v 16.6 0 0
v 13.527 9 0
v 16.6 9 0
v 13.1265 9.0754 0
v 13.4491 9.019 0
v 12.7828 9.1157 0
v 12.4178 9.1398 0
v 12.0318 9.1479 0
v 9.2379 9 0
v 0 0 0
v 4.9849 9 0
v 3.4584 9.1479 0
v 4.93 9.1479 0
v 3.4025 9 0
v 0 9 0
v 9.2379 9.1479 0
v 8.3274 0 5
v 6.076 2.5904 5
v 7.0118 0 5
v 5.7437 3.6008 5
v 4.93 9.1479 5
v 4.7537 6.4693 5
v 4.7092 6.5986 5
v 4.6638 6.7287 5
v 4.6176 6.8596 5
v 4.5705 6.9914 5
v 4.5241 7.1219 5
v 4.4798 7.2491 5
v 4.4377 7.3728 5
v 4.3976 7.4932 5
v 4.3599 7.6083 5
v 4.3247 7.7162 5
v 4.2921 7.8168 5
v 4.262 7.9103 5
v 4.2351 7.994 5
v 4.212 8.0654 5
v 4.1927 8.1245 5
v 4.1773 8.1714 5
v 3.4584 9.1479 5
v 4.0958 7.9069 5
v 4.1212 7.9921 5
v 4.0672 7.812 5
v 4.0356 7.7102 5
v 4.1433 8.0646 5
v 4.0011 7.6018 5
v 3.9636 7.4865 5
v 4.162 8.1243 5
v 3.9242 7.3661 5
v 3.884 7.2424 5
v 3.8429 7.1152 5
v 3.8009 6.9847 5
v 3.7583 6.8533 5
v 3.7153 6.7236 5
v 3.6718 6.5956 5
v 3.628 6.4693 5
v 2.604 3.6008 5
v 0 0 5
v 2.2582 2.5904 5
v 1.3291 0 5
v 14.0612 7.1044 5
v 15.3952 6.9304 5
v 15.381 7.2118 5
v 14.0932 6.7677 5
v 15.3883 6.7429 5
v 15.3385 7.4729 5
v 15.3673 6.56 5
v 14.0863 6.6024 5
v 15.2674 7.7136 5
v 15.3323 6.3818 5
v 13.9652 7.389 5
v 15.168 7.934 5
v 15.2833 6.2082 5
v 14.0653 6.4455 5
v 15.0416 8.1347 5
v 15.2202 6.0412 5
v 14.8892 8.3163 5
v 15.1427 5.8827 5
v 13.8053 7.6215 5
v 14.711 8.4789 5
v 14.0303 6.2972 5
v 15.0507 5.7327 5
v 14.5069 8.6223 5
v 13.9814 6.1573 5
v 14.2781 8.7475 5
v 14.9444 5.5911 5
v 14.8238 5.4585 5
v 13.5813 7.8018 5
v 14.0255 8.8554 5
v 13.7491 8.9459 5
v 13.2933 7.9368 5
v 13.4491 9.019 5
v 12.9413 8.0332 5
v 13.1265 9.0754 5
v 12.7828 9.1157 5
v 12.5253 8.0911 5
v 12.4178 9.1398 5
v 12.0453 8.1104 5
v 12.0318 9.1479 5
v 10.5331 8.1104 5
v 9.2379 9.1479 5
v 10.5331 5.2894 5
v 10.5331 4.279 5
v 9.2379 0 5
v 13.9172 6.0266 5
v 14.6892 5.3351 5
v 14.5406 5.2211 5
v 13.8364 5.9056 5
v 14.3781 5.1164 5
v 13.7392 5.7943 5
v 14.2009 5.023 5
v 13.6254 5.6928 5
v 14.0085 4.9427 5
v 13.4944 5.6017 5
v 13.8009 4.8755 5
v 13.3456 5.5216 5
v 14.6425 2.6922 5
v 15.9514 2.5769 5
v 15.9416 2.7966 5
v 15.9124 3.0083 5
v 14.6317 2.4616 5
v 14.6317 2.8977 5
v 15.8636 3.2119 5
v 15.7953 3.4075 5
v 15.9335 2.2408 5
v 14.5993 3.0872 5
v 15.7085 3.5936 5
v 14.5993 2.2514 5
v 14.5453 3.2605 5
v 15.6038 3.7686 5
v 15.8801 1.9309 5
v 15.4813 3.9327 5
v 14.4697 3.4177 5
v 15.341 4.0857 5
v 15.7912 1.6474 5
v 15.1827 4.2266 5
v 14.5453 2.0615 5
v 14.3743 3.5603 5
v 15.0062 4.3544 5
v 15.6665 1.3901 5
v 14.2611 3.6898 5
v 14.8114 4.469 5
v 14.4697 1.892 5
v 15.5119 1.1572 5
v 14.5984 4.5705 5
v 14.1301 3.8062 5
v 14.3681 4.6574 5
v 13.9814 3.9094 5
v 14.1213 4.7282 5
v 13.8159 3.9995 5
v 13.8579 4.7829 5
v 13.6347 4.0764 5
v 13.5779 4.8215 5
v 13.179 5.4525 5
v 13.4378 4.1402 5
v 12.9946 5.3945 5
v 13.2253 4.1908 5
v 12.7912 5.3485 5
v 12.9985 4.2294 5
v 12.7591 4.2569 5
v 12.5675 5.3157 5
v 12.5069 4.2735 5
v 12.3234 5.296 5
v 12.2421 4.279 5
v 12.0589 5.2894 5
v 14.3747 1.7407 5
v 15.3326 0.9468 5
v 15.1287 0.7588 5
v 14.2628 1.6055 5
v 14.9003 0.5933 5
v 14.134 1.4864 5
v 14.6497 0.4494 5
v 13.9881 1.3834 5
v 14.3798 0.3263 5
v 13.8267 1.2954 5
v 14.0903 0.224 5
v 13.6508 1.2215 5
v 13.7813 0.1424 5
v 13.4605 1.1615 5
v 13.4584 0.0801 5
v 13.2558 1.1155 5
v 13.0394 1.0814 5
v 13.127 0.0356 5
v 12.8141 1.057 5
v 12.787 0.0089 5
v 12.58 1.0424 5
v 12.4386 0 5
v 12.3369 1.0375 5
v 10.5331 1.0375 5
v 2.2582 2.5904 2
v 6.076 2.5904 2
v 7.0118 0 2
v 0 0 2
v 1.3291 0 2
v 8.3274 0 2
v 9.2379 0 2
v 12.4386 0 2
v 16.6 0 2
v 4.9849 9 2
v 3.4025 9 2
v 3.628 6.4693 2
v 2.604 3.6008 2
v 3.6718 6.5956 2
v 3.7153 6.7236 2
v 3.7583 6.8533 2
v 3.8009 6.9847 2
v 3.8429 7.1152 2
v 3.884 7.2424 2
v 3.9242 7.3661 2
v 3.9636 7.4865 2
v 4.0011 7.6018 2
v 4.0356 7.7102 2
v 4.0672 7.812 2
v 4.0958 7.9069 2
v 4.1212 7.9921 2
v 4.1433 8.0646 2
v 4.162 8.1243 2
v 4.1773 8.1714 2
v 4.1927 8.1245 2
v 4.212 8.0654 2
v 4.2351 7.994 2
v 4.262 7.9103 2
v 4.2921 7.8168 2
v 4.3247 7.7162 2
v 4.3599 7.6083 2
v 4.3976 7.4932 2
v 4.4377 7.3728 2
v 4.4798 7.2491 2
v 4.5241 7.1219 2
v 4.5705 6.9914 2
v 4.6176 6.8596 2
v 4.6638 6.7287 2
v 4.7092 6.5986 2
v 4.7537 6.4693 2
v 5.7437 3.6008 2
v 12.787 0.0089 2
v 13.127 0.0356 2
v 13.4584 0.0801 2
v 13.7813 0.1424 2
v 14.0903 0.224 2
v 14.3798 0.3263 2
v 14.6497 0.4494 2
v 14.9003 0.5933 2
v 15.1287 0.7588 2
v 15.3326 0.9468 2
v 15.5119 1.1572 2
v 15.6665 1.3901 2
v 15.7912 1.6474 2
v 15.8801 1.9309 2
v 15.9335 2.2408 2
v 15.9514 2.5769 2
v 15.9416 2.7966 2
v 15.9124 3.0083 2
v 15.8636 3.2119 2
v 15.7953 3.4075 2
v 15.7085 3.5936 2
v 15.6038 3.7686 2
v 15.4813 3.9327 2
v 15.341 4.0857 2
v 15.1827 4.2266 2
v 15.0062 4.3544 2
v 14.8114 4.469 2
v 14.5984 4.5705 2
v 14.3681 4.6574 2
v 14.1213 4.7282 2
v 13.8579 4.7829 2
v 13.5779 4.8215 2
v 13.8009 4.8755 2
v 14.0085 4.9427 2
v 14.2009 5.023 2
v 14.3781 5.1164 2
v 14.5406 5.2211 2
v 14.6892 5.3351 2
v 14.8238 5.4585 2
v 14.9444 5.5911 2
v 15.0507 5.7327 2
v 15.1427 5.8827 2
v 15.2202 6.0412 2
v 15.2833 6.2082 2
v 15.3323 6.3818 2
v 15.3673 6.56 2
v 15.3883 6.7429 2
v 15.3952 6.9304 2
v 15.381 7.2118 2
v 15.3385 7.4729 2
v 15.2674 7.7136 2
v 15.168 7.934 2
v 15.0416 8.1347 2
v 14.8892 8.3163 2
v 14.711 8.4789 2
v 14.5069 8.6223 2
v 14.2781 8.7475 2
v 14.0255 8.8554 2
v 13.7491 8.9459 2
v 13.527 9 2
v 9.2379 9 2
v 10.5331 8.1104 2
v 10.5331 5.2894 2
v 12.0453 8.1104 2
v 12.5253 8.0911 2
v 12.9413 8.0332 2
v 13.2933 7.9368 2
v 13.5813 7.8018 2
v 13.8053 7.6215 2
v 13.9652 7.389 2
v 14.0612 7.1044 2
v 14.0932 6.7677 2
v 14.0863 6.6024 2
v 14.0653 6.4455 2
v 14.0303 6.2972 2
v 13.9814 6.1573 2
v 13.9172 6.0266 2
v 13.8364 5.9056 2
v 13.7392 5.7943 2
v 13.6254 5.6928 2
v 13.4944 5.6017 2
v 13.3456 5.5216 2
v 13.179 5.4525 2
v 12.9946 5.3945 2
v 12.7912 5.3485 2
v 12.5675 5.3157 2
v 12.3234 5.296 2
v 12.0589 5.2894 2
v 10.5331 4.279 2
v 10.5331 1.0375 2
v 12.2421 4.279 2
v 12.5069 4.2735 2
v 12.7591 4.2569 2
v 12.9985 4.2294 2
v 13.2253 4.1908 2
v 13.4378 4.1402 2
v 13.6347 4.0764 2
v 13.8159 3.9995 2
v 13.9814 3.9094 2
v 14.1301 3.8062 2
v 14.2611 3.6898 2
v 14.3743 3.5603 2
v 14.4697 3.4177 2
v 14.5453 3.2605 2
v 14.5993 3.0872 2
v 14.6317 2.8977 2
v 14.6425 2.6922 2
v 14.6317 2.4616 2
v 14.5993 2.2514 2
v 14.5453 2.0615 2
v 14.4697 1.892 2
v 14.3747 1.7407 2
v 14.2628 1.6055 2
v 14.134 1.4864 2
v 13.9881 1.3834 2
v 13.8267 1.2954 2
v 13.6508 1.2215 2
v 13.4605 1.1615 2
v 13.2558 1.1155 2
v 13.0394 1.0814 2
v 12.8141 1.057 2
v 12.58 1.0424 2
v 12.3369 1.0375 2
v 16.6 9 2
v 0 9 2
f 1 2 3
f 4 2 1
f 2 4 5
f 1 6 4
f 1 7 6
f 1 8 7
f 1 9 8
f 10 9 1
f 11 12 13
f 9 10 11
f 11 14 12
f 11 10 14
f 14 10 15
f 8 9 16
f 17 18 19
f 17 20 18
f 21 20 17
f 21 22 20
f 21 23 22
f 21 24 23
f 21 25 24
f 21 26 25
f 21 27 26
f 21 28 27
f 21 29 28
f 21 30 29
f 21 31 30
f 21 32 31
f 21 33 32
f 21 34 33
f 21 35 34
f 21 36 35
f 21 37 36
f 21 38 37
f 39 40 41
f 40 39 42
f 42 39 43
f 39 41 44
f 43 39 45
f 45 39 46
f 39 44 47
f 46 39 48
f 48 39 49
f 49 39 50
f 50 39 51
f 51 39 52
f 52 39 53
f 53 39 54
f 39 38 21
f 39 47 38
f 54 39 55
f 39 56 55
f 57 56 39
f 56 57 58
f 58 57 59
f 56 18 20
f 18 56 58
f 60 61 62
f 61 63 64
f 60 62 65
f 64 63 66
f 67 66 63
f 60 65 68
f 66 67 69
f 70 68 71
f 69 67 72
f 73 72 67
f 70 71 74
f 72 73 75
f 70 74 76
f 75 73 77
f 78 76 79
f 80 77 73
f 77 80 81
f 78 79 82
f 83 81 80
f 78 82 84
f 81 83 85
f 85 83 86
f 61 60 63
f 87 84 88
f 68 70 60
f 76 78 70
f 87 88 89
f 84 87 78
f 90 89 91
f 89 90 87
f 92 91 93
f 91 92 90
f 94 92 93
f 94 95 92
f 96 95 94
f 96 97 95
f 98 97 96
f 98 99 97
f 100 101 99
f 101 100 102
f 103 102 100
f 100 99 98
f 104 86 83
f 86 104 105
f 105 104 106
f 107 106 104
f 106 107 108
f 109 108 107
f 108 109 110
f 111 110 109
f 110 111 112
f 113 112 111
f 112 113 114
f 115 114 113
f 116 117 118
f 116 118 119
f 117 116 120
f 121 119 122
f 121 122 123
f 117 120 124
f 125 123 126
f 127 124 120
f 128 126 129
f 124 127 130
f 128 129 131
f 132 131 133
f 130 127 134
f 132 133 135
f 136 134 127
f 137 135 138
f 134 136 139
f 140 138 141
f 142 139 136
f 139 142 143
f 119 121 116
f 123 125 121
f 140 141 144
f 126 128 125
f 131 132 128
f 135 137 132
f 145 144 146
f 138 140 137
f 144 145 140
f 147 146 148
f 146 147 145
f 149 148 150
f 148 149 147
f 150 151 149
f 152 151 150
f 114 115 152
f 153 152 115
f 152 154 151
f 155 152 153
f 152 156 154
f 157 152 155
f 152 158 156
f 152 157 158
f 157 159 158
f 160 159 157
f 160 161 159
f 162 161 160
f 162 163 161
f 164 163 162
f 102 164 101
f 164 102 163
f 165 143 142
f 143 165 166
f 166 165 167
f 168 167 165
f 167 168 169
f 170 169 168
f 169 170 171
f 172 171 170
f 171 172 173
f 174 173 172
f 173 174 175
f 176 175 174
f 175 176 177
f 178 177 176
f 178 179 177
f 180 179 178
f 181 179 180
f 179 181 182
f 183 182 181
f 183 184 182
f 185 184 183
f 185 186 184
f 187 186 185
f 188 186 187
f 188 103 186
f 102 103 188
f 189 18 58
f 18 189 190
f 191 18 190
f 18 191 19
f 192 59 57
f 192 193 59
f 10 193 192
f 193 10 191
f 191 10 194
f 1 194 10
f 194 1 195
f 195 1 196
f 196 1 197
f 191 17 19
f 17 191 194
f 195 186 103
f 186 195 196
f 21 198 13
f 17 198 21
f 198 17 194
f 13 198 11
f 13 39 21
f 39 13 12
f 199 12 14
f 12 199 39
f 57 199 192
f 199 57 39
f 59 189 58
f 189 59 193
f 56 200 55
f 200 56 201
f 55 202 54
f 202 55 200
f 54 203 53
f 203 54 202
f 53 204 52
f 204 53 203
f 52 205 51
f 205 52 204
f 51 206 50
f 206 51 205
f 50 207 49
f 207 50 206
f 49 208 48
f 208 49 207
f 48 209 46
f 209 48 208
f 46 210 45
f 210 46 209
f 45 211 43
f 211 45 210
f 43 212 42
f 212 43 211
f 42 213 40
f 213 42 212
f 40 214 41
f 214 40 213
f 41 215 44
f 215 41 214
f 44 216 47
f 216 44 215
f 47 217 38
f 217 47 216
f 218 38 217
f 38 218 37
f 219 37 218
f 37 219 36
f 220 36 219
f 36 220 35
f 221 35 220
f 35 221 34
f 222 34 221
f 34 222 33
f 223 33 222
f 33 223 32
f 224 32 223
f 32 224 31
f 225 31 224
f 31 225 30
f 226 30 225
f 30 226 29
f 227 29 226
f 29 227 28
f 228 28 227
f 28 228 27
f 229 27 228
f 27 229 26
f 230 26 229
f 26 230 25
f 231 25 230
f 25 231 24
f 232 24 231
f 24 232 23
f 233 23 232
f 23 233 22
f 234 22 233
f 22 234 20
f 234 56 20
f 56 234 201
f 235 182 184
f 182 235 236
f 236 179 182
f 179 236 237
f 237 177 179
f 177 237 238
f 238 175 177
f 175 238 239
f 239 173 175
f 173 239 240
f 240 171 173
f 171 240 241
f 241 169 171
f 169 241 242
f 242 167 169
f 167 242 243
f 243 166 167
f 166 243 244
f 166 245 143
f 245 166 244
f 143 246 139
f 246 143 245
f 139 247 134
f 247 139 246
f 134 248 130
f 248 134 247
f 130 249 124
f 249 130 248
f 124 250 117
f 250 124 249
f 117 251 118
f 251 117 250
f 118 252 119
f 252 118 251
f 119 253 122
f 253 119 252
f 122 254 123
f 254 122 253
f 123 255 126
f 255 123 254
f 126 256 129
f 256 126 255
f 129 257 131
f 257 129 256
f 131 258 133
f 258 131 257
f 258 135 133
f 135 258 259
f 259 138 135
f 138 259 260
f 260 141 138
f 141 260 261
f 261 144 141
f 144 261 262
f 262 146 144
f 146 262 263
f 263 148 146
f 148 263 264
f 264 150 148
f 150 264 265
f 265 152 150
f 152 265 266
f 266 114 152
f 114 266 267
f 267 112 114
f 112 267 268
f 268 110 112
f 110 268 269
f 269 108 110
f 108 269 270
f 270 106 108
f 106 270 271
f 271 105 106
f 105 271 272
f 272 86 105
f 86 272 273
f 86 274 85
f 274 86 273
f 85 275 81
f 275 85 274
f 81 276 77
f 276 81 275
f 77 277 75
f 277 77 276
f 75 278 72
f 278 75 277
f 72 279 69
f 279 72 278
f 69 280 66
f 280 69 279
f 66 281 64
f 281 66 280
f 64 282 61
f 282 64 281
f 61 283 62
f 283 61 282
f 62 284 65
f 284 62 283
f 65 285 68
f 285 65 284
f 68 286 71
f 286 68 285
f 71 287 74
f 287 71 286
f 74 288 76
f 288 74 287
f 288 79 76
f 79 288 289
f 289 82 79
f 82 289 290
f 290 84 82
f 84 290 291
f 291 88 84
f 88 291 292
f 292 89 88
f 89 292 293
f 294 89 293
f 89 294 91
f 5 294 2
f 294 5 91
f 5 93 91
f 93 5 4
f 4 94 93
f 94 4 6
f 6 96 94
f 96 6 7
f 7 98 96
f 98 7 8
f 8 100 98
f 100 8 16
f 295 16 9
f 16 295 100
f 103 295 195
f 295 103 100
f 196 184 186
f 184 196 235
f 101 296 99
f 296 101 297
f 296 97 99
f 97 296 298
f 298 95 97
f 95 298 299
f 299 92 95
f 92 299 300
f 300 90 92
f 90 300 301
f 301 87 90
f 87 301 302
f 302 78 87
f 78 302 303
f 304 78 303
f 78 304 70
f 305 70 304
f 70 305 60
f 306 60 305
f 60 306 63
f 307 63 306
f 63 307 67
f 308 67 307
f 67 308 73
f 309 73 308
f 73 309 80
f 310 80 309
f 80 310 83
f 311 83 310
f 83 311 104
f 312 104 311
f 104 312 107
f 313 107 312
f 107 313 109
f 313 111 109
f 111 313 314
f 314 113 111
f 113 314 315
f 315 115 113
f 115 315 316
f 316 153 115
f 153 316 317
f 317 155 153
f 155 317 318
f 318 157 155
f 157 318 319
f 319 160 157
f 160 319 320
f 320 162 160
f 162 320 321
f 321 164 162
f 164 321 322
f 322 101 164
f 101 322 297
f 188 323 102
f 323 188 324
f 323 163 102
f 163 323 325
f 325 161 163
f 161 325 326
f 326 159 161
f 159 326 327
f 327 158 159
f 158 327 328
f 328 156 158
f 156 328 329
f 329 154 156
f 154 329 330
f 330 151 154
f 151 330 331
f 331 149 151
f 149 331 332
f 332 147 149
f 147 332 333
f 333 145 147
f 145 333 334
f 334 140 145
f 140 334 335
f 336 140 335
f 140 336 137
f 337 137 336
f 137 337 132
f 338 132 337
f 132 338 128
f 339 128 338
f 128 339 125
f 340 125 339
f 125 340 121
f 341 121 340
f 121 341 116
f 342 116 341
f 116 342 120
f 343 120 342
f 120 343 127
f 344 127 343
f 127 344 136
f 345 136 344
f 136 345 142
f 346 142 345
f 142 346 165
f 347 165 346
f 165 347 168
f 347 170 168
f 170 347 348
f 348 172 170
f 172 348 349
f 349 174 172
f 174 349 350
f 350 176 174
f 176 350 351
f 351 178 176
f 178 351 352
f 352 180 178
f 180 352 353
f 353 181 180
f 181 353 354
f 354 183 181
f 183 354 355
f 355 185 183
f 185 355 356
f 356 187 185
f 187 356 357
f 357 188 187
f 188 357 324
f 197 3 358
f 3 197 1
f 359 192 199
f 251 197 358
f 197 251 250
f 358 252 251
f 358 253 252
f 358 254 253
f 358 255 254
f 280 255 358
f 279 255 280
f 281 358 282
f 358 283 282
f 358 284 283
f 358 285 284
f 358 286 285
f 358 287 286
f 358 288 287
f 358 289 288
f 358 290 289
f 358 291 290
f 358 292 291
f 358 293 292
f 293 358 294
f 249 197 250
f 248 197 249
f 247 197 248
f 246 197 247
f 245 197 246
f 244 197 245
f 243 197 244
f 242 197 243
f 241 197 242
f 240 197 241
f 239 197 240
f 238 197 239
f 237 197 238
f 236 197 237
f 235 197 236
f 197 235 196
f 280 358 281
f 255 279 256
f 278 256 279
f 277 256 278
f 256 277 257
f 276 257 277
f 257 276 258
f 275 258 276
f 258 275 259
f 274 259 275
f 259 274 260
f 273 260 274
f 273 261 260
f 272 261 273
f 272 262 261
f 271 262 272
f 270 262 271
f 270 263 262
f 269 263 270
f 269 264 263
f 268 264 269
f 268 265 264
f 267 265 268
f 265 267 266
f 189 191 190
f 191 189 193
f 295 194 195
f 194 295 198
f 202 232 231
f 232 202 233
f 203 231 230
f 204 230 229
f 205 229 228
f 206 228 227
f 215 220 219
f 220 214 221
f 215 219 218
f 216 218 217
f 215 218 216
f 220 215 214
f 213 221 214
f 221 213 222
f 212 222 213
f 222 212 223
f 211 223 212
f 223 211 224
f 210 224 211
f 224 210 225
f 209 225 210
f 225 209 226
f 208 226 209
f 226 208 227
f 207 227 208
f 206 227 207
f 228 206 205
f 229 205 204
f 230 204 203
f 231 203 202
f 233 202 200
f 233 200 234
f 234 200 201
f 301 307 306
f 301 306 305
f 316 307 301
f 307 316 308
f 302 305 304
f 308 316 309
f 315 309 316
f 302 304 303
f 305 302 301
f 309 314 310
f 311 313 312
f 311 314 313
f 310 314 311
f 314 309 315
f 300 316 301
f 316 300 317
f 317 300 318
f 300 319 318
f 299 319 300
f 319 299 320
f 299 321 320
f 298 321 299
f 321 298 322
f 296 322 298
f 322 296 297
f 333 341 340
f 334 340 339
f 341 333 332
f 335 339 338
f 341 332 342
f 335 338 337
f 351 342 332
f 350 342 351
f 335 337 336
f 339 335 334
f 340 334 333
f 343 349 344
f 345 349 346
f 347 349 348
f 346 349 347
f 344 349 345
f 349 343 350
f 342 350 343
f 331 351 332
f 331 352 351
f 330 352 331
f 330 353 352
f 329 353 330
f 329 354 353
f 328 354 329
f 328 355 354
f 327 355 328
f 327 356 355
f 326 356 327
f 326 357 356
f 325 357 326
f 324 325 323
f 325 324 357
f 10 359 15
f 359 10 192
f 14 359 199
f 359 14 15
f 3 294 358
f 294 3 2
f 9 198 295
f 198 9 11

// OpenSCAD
// book Simplifying 3D printing, chapter 5, page 125
display_text="AB";
text_len = len(display_text);
echo(text_len);
font = "Courier New:style=Regular";
linear_extrude(5)
    text(display_text, font=font);

cube([text_len*8.3,9,2]);
